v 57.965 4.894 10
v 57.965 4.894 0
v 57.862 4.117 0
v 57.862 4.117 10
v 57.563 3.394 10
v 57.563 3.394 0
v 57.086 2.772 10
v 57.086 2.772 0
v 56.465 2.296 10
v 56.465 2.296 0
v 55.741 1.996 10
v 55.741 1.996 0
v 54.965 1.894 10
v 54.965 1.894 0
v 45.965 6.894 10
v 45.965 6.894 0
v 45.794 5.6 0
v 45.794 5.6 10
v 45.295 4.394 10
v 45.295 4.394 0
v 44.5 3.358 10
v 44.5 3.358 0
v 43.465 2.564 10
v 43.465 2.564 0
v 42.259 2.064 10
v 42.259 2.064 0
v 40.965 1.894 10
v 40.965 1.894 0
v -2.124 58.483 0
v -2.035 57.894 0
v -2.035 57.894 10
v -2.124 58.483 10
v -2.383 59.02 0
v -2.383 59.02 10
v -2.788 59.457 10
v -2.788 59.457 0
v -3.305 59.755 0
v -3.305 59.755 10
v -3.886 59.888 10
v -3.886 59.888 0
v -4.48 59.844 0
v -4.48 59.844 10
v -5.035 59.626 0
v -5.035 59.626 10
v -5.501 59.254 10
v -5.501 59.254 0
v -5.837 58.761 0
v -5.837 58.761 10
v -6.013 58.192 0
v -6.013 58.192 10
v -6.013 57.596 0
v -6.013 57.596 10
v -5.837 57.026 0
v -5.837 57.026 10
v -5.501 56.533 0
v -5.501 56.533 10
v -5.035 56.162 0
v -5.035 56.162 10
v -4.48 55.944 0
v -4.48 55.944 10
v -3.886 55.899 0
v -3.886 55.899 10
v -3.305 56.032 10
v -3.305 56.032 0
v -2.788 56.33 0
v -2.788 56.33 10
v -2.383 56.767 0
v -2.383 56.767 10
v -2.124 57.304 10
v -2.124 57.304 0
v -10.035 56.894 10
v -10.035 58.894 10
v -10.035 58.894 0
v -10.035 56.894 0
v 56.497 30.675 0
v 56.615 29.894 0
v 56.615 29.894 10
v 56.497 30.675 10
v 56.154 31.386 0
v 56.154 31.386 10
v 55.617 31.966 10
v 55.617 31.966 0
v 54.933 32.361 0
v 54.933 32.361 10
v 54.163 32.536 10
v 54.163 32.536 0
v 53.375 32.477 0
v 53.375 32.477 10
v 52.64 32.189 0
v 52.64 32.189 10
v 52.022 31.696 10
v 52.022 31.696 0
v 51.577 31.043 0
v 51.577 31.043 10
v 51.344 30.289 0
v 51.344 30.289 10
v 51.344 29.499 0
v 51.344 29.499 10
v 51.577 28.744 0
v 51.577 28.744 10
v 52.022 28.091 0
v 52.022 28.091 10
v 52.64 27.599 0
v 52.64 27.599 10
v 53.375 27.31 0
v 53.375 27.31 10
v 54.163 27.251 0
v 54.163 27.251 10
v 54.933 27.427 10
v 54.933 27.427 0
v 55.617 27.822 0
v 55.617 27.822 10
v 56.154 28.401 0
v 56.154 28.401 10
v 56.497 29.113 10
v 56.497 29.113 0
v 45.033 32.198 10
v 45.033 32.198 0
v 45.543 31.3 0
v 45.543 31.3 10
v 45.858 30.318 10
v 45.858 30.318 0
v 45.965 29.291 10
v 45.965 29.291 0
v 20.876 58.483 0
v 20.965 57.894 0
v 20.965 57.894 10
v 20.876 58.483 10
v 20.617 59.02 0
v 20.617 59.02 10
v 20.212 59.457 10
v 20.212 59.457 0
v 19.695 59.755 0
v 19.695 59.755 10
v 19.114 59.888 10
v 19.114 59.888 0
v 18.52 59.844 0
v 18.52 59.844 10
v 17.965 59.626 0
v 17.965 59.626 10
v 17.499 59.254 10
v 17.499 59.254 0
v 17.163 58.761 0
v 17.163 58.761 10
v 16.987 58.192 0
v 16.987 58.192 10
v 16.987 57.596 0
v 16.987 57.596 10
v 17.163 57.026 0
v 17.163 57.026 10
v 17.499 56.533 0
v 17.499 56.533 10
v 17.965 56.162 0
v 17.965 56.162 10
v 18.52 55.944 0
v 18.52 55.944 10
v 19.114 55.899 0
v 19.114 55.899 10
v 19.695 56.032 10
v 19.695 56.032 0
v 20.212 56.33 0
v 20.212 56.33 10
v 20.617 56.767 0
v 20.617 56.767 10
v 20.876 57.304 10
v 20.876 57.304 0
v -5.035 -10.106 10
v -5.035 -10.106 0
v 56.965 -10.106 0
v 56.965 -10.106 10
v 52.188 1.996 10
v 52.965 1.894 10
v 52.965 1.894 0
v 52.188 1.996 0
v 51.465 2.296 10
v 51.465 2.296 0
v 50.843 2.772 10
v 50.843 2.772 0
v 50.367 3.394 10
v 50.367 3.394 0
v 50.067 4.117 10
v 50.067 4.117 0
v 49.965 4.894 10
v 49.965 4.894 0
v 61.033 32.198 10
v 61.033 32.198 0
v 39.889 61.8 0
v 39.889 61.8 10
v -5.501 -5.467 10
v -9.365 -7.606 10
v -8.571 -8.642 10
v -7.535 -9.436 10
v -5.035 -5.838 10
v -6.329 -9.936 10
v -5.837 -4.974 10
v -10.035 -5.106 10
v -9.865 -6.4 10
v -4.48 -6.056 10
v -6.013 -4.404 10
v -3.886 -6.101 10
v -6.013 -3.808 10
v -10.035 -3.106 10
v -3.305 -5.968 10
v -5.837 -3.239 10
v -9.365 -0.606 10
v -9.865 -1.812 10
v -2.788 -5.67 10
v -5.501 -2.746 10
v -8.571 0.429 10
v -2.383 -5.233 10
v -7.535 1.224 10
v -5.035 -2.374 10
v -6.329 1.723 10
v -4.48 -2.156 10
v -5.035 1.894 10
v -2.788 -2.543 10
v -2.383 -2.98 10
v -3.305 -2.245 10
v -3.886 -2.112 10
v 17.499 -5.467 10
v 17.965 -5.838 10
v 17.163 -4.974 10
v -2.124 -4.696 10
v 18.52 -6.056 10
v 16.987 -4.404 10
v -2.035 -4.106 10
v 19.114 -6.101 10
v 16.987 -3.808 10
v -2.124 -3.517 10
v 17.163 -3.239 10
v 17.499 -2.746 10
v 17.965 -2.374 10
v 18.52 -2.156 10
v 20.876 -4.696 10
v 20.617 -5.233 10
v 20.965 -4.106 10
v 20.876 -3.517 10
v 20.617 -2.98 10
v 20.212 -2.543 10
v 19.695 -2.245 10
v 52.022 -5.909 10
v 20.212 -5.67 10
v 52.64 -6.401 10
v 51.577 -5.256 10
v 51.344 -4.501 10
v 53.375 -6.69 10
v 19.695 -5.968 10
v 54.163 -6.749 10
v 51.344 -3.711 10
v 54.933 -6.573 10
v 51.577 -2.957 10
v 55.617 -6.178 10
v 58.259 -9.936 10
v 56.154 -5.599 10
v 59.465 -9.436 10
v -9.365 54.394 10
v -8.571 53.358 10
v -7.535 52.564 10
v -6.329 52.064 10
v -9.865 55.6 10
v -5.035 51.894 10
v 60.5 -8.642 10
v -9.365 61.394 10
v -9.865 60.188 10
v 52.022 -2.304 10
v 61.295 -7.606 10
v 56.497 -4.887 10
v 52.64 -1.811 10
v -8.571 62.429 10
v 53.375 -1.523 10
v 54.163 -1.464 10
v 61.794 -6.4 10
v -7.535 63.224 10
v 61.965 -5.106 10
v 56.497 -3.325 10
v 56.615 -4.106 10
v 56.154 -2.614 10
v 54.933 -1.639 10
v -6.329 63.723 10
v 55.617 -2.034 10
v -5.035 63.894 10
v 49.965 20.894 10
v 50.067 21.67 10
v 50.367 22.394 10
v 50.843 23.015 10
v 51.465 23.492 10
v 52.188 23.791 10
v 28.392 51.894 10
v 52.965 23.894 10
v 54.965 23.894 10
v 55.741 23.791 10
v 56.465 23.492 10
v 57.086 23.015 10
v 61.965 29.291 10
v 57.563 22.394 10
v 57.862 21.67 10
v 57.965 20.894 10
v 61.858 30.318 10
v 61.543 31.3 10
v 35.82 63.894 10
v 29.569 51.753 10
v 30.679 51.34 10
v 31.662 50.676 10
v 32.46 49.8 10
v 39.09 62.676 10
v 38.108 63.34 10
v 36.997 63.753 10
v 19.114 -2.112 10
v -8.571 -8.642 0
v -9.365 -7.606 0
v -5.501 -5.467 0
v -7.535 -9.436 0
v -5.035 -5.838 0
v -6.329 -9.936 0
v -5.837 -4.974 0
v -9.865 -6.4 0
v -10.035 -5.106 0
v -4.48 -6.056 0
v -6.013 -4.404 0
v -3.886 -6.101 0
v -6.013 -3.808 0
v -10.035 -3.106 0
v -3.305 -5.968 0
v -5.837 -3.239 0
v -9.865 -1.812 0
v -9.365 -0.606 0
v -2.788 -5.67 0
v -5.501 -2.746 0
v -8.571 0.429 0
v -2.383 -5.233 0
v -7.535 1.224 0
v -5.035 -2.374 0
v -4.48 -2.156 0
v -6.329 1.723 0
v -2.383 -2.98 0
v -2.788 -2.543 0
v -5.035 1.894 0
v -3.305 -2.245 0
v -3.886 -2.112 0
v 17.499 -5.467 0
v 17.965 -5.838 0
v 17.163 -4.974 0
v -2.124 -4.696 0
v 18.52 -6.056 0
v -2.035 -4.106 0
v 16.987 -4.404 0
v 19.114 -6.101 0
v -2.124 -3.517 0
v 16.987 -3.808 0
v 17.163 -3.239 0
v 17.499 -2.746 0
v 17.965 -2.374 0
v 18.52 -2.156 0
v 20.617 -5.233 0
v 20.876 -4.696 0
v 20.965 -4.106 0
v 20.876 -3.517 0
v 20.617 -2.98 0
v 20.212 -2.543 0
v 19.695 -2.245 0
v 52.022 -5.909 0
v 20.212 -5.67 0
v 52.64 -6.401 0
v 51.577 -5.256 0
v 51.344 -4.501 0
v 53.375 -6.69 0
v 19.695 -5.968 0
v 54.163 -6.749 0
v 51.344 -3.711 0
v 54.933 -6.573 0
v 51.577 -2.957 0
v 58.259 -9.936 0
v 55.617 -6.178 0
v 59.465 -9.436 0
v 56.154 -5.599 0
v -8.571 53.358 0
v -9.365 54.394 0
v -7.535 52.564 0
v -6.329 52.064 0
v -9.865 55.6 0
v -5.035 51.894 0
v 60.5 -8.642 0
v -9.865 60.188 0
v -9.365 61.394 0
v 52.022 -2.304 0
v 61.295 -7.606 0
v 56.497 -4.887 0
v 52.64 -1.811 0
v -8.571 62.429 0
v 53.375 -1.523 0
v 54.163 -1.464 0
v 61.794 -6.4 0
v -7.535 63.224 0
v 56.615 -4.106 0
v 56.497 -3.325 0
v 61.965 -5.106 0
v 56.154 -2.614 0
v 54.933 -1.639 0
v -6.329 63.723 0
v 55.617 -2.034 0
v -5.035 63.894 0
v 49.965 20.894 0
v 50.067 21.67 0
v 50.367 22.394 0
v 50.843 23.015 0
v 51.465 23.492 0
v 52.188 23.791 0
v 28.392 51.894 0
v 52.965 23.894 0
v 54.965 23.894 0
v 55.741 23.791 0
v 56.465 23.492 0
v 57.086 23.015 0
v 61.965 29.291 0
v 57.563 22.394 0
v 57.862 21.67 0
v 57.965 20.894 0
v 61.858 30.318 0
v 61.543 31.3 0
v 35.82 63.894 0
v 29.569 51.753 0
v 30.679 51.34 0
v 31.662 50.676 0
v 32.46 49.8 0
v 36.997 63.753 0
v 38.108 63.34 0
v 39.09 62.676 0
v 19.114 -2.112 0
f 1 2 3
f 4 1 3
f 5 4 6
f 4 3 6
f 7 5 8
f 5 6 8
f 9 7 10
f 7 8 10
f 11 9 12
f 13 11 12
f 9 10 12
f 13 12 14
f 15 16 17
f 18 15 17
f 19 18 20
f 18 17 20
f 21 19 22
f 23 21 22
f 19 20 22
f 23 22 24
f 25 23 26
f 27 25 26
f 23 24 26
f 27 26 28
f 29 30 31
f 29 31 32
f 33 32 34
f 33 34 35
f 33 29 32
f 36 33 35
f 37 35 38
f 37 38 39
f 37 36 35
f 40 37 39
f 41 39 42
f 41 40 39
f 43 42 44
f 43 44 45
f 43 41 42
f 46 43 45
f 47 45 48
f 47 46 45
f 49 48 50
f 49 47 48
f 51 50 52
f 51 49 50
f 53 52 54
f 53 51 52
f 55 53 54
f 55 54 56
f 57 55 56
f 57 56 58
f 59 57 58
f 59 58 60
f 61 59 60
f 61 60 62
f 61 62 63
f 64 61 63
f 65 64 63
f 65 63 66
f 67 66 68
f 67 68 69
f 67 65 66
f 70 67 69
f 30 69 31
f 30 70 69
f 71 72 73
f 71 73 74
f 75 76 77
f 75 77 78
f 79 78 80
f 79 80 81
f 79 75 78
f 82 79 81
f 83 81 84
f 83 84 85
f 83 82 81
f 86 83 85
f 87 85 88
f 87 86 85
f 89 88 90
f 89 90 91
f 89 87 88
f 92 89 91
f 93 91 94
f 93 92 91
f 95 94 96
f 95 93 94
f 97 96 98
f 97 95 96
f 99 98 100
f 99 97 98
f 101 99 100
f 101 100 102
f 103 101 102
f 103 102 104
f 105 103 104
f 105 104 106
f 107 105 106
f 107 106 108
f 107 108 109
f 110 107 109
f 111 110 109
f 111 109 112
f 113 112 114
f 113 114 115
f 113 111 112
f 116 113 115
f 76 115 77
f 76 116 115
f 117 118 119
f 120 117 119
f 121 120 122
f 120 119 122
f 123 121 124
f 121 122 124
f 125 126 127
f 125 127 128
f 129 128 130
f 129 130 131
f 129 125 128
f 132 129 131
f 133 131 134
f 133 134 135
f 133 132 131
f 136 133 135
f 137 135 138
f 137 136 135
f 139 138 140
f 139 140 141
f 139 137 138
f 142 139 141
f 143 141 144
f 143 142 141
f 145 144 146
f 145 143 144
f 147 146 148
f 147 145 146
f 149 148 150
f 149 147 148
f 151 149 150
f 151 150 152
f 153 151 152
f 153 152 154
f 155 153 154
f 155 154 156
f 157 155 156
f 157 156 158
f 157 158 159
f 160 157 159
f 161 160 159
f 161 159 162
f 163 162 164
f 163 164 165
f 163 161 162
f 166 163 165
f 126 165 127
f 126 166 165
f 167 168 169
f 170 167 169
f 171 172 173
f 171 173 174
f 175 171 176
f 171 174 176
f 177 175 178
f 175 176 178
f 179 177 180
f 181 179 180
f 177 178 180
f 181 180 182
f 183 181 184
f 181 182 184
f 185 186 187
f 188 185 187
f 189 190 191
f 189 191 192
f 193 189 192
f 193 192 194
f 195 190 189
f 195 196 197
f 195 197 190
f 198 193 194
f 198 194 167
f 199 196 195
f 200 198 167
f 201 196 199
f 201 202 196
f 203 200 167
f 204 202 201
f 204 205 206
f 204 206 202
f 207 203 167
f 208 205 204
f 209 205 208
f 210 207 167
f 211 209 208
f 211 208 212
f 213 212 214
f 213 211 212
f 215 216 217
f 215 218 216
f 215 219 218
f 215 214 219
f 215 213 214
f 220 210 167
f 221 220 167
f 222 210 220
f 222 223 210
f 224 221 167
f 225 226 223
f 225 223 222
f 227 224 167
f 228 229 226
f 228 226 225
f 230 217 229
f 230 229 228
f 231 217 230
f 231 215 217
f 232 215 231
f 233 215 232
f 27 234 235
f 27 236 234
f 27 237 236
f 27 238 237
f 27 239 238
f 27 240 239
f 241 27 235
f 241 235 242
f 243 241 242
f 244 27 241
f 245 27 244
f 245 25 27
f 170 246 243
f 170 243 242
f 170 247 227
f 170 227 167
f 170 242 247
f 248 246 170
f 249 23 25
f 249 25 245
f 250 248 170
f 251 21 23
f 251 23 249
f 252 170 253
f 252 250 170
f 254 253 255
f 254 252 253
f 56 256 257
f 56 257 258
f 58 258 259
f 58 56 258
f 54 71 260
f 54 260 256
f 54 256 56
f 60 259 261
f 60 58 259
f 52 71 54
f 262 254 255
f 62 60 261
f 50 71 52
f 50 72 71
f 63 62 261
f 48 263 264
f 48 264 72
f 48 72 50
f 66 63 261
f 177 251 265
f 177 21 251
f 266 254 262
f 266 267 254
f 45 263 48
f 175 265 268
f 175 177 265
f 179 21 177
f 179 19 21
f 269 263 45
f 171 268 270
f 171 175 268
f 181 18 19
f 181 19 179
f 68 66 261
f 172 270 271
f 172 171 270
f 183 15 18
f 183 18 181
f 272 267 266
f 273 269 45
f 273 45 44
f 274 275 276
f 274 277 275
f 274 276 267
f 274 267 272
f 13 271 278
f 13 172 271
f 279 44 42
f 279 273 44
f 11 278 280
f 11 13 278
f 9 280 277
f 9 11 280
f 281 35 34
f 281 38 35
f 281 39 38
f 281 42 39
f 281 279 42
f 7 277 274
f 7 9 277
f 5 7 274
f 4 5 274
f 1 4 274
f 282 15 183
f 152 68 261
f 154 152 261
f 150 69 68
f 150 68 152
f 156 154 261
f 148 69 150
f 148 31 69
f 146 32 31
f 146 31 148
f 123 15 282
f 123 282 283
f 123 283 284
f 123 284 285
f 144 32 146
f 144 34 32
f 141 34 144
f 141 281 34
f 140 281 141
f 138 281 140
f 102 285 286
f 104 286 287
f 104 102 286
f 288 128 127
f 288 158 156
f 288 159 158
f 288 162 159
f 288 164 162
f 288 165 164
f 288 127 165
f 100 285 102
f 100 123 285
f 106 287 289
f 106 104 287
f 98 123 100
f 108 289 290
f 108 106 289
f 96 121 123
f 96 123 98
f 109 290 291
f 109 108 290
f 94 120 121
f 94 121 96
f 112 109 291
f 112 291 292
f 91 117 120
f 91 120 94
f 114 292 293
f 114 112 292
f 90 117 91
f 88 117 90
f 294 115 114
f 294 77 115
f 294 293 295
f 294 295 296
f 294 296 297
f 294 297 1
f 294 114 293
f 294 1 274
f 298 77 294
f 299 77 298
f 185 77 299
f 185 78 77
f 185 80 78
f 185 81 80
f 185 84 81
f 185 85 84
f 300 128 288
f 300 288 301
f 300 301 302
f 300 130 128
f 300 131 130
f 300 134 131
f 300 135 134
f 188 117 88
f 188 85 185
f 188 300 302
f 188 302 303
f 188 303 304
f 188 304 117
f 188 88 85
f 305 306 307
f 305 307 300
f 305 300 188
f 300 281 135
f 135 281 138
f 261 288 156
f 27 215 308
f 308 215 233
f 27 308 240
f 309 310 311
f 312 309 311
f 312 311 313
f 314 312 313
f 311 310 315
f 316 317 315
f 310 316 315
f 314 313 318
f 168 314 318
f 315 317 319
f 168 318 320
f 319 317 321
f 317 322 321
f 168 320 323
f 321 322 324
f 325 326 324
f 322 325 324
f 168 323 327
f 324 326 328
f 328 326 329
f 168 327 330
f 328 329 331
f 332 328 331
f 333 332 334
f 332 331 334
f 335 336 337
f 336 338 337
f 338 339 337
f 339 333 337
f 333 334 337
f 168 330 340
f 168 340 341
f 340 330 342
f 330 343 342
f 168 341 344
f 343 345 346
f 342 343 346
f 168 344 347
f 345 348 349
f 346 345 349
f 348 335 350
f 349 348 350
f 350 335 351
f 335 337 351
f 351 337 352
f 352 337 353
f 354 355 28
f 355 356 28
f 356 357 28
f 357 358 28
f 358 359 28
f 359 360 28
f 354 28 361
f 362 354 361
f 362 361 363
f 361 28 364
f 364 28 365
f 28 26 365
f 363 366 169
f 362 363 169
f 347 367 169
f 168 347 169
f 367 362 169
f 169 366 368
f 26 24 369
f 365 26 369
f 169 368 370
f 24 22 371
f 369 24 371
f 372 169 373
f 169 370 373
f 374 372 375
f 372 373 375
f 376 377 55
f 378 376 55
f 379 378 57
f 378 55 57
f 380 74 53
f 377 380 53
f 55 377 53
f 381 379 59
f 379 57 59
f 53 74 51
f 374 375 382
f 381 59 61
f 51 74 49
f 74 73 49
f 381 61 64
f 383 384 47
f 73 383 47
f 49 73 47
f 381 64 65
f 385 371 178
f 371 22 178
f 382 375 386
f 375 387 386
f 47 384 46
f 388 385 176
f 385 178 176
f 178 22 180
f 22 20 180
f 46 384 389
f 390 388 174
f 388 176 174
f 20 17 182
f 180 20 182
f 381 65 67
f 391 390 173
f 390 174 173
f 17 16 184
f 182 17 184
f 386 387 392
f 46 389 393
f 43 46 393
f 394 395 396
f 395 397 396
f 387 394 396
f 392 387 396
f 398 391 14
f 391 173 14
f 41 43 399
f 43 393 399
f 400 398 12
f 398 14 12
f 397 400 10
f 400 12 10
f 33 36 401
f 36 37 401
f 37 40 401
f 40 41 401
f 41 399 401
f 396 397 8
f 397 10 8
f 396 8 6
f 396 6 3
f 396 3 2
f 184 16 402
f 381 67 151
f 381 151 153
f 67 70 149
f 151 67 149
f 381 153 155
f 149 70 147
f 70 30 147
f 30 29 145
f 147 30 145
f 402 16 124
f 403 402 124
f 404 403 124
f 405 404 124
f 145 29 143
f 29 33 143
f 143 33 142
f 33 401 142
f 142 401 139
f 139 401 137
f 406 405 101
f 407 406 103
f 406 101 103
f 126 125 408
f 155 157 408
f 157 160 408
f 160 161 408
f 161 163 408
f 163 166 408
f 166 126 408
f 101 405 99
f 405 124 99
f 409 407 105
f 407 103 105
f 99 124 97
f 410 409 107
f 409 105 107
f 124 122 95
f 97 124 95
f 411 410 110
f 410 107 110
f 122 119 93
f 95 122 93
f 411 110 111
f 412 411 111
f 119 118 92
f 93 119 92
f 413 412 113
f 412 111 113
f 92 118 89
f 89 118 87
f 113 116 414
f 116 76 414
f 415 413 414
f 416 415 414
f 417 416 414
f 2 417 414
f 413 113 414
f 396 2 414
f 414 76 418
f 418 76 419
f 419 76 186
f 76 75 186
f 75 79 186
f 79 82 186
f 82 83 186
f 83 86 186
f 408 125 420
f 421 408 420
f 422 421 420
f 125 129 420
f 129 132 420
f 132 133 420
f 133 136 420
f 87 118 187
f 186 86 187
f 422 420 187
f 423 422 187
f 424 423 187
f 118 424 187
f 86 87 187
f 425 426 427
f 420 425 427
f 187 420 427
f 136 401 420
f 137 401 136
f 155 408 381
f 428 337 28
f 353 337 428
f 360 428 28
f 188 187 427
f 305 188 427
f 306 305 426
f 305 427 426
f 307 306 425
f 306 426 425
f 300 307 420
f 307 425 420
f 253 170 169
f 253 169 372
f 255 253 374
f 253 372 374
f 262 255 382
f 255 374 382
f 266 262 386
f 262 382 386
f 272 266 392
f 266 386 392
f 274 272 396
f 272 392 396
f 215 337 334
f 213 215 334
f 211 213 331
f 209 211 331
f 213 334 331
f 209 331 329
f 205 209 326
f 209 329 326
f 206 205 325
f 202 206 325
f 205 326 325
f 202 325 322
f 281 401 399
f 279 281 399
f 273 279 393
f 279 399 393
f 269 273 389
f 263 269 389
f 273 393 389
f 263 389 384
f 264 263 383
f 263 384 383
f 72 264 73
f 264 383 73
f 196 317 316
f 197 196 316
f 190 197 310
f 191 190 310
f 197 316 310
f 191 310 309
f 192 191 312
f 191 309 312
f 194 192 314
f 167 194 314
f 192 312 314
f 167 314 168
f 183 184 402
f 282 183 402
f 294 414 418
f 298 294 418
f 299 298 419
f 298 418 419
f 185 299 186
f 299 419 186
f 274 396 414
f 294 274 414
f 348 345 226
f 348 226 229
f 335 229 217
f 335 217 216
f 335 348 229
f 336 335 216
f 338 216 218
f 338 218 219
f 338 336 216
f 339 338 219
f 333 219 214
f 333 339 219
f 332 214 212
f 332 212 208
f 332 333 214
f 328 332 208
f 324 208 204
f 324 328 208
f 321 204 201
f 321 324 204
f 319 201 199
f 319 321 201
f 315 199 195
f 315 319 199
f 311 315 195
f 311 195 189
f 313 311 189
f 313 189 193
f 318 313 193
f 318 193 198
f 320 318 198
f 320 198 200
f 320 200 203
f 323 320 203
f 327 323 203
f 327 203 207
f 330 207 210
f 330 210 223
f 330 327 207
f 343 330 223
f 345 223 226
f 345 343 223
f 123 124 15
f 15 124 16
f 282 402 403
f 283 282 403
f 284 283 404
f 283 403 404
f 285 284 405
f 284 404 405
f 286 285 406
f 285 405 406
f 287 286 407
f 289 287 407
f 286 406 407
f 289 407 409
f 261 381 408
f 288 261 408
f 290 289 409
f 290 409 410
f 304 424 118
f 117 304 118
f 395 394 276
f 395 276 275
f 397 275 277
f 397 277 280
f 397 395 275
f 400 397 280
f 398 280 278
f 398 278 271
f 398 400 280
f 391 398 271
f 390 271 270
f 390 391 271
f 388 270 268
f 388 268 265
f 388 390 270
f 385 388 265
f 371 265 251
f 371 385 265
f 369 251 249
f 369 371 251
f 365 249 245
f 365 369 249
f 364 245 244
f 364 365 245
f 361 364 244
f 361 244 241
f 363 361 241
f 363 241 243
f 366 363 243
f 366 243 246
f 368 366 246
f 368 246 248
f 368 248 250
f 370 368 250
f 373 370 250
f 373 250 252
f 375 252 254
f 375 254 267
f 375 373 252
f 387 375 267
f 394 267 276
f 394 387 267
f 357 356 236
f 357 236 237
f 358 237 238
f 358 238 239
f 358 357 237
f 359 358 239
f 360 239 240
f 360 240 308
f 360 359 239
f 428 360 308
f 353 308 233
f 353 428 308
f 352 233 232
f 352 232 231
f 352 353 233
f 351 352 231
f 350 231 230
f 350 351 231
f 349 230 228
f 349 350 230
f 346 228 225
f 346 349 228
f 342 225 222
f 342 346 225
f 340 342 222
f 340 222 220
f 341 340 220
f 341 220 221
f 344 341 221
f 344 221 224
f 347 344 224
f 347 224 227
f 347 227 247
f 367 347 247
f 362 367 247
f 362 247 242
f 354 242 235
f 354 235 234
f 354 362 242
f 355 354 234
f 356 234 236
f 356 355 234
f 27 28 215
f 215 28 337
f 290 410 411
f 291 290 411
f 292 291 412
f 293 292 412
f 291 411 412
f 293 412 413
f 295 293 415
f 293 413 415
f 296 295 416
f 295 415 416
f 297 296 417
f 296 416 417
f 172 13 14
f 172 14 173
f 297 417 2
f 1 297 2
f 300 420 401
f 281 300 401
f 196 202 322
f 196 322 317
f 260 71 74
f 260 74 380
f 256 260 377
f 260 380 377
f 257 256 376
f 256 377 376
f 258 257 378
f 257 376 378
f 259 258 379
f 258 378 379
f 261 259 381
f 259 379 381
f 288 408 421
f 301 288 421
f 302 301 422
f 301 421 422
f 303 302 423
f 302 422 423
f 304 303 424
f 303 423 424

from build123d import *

# Parameters (mm, degrees)
F0_R     = 2
F0_R_2   = 2.65
F1_DEPTH = 10


with BuildPart() as f1:
    # F0 (on Top) → F1 (new body)
    with BuildSketch(Plane.XY):
        with BuildLine():
            Line((-5.035349, -10.106315), (56.964651, -10.106315))
            ThreePointArc((56.964651, -10.106315), (60.500185, -8.641849), (61.964651, -5.106315))
            Line((61.964651, -5.106315), (61.964651, 29.291359))
            ThreePointArc((61.964651, 29.291359), (61.726129, 30.817247), (61.033319, 32.19755))
            Line((61.033319, 32.19755), (39.888801, 61.799876))
            ThreePointArc((39.888801, 61.799876), (38.108041, 63.339523), (35.820133, 63.893685))
            Line((35.820133, 63.893685), (-5.035349, 63.893685))
            ThreePointArc((-5.035349, 63.893685), (-8.570883, 62.429219), (-10.035349, 58.893685))
            Line((-10.035349, 58.893685), (-10.035349, 56.893685))
            ThreePointArc((-10.035349, 56.893685), (-8.570883, 53.358151), (-5.035349, 51.893685))
            Line((-5.035349, 51.893685), (28.391562, 51.893685))
            ThreePointArc((28.391562, 51.893685), (30.67947, 51.339523), (32.460229, 49.799876))
            Line((32.460229, 49.799876), (45.033319, 32.19755))
            ThreePointArc((45.033319, 32.19755), (45.726129, 30.817247), (45.964651, 29.291359))
            Line((45.964651, 29.291359), (45.964651, 6.893685))
            ThreePointArc((45.964651, 6.893685), (44.500185, 3.358151), (40.964651, 1.893685))
            Line((40.964651, 1.893685), (-5.035349, 1.893685))
            ThreePointArc((-5.035349, 1.893685), (-8.570883, 0.429219), (-10.035349, -3.106315))
            Line((-10.035349, -3.106315), (-10.035349, -5.106315))
            ThreePointArc((-10.035349, -5.106315), (-8.570883, -8.641849), (-5.035349, -10.106315))
        make_face()
        with Locations((-4.035349, -4.106315)):
            Circle(F0_R, mode=Mode.SUBTRACT)
        with Locations((18.964651, -4.106315)):
            Circle(F0_R, mode=Mode.SUBTRACT)
        with Locations((53.964651, -4.106315)):
            Circle(F0_R_2, mode=Mode.SUBTRACT)
        with BuildLine():
            ThreePointArc((49.964651, 20.893685), (50.843331, 23.015005), (52.964651, 23.893685))
            Line((52.964651, 23.893685), (54.964651, 23.893685))
            ThreePointArc((54.964651, 23.893685), (57.085972, 23.015005), (57.964651, 20.893685))
            Line((57.964651, 20.893685), (57.964651, 4.893685))
            ThreePointArc((57.964651, 4.893685), (57.085972, 2.772364), (54.964651, 1.893685))
            Line((54.964651, 1.893685), (52.964651, 1.893685))
            ThreePointArc((52.964651, 1.893685), (50.843331, 2.772364), (49.964651, 4.893685))
            Line((49.964651, 4.893685), (49.964651, 20.893685))
        make_face(mode=Mode.SUBTRACT)
        with Locations((-4.035349, 57.893685)):
            Circle(F0_R, mode=Mode.SUBTRACT)
        with Locations((18.964651, 57.893685)):
            Circle(F0_R, mode=Mode.SUBTRACT)
        with Locations((53.964651, 29.893685)):
            Circle(F0_R_2, mode=Mode.SUBTRACT)
    extrude(amount=F1_DEPTH)


solid = f1.part
